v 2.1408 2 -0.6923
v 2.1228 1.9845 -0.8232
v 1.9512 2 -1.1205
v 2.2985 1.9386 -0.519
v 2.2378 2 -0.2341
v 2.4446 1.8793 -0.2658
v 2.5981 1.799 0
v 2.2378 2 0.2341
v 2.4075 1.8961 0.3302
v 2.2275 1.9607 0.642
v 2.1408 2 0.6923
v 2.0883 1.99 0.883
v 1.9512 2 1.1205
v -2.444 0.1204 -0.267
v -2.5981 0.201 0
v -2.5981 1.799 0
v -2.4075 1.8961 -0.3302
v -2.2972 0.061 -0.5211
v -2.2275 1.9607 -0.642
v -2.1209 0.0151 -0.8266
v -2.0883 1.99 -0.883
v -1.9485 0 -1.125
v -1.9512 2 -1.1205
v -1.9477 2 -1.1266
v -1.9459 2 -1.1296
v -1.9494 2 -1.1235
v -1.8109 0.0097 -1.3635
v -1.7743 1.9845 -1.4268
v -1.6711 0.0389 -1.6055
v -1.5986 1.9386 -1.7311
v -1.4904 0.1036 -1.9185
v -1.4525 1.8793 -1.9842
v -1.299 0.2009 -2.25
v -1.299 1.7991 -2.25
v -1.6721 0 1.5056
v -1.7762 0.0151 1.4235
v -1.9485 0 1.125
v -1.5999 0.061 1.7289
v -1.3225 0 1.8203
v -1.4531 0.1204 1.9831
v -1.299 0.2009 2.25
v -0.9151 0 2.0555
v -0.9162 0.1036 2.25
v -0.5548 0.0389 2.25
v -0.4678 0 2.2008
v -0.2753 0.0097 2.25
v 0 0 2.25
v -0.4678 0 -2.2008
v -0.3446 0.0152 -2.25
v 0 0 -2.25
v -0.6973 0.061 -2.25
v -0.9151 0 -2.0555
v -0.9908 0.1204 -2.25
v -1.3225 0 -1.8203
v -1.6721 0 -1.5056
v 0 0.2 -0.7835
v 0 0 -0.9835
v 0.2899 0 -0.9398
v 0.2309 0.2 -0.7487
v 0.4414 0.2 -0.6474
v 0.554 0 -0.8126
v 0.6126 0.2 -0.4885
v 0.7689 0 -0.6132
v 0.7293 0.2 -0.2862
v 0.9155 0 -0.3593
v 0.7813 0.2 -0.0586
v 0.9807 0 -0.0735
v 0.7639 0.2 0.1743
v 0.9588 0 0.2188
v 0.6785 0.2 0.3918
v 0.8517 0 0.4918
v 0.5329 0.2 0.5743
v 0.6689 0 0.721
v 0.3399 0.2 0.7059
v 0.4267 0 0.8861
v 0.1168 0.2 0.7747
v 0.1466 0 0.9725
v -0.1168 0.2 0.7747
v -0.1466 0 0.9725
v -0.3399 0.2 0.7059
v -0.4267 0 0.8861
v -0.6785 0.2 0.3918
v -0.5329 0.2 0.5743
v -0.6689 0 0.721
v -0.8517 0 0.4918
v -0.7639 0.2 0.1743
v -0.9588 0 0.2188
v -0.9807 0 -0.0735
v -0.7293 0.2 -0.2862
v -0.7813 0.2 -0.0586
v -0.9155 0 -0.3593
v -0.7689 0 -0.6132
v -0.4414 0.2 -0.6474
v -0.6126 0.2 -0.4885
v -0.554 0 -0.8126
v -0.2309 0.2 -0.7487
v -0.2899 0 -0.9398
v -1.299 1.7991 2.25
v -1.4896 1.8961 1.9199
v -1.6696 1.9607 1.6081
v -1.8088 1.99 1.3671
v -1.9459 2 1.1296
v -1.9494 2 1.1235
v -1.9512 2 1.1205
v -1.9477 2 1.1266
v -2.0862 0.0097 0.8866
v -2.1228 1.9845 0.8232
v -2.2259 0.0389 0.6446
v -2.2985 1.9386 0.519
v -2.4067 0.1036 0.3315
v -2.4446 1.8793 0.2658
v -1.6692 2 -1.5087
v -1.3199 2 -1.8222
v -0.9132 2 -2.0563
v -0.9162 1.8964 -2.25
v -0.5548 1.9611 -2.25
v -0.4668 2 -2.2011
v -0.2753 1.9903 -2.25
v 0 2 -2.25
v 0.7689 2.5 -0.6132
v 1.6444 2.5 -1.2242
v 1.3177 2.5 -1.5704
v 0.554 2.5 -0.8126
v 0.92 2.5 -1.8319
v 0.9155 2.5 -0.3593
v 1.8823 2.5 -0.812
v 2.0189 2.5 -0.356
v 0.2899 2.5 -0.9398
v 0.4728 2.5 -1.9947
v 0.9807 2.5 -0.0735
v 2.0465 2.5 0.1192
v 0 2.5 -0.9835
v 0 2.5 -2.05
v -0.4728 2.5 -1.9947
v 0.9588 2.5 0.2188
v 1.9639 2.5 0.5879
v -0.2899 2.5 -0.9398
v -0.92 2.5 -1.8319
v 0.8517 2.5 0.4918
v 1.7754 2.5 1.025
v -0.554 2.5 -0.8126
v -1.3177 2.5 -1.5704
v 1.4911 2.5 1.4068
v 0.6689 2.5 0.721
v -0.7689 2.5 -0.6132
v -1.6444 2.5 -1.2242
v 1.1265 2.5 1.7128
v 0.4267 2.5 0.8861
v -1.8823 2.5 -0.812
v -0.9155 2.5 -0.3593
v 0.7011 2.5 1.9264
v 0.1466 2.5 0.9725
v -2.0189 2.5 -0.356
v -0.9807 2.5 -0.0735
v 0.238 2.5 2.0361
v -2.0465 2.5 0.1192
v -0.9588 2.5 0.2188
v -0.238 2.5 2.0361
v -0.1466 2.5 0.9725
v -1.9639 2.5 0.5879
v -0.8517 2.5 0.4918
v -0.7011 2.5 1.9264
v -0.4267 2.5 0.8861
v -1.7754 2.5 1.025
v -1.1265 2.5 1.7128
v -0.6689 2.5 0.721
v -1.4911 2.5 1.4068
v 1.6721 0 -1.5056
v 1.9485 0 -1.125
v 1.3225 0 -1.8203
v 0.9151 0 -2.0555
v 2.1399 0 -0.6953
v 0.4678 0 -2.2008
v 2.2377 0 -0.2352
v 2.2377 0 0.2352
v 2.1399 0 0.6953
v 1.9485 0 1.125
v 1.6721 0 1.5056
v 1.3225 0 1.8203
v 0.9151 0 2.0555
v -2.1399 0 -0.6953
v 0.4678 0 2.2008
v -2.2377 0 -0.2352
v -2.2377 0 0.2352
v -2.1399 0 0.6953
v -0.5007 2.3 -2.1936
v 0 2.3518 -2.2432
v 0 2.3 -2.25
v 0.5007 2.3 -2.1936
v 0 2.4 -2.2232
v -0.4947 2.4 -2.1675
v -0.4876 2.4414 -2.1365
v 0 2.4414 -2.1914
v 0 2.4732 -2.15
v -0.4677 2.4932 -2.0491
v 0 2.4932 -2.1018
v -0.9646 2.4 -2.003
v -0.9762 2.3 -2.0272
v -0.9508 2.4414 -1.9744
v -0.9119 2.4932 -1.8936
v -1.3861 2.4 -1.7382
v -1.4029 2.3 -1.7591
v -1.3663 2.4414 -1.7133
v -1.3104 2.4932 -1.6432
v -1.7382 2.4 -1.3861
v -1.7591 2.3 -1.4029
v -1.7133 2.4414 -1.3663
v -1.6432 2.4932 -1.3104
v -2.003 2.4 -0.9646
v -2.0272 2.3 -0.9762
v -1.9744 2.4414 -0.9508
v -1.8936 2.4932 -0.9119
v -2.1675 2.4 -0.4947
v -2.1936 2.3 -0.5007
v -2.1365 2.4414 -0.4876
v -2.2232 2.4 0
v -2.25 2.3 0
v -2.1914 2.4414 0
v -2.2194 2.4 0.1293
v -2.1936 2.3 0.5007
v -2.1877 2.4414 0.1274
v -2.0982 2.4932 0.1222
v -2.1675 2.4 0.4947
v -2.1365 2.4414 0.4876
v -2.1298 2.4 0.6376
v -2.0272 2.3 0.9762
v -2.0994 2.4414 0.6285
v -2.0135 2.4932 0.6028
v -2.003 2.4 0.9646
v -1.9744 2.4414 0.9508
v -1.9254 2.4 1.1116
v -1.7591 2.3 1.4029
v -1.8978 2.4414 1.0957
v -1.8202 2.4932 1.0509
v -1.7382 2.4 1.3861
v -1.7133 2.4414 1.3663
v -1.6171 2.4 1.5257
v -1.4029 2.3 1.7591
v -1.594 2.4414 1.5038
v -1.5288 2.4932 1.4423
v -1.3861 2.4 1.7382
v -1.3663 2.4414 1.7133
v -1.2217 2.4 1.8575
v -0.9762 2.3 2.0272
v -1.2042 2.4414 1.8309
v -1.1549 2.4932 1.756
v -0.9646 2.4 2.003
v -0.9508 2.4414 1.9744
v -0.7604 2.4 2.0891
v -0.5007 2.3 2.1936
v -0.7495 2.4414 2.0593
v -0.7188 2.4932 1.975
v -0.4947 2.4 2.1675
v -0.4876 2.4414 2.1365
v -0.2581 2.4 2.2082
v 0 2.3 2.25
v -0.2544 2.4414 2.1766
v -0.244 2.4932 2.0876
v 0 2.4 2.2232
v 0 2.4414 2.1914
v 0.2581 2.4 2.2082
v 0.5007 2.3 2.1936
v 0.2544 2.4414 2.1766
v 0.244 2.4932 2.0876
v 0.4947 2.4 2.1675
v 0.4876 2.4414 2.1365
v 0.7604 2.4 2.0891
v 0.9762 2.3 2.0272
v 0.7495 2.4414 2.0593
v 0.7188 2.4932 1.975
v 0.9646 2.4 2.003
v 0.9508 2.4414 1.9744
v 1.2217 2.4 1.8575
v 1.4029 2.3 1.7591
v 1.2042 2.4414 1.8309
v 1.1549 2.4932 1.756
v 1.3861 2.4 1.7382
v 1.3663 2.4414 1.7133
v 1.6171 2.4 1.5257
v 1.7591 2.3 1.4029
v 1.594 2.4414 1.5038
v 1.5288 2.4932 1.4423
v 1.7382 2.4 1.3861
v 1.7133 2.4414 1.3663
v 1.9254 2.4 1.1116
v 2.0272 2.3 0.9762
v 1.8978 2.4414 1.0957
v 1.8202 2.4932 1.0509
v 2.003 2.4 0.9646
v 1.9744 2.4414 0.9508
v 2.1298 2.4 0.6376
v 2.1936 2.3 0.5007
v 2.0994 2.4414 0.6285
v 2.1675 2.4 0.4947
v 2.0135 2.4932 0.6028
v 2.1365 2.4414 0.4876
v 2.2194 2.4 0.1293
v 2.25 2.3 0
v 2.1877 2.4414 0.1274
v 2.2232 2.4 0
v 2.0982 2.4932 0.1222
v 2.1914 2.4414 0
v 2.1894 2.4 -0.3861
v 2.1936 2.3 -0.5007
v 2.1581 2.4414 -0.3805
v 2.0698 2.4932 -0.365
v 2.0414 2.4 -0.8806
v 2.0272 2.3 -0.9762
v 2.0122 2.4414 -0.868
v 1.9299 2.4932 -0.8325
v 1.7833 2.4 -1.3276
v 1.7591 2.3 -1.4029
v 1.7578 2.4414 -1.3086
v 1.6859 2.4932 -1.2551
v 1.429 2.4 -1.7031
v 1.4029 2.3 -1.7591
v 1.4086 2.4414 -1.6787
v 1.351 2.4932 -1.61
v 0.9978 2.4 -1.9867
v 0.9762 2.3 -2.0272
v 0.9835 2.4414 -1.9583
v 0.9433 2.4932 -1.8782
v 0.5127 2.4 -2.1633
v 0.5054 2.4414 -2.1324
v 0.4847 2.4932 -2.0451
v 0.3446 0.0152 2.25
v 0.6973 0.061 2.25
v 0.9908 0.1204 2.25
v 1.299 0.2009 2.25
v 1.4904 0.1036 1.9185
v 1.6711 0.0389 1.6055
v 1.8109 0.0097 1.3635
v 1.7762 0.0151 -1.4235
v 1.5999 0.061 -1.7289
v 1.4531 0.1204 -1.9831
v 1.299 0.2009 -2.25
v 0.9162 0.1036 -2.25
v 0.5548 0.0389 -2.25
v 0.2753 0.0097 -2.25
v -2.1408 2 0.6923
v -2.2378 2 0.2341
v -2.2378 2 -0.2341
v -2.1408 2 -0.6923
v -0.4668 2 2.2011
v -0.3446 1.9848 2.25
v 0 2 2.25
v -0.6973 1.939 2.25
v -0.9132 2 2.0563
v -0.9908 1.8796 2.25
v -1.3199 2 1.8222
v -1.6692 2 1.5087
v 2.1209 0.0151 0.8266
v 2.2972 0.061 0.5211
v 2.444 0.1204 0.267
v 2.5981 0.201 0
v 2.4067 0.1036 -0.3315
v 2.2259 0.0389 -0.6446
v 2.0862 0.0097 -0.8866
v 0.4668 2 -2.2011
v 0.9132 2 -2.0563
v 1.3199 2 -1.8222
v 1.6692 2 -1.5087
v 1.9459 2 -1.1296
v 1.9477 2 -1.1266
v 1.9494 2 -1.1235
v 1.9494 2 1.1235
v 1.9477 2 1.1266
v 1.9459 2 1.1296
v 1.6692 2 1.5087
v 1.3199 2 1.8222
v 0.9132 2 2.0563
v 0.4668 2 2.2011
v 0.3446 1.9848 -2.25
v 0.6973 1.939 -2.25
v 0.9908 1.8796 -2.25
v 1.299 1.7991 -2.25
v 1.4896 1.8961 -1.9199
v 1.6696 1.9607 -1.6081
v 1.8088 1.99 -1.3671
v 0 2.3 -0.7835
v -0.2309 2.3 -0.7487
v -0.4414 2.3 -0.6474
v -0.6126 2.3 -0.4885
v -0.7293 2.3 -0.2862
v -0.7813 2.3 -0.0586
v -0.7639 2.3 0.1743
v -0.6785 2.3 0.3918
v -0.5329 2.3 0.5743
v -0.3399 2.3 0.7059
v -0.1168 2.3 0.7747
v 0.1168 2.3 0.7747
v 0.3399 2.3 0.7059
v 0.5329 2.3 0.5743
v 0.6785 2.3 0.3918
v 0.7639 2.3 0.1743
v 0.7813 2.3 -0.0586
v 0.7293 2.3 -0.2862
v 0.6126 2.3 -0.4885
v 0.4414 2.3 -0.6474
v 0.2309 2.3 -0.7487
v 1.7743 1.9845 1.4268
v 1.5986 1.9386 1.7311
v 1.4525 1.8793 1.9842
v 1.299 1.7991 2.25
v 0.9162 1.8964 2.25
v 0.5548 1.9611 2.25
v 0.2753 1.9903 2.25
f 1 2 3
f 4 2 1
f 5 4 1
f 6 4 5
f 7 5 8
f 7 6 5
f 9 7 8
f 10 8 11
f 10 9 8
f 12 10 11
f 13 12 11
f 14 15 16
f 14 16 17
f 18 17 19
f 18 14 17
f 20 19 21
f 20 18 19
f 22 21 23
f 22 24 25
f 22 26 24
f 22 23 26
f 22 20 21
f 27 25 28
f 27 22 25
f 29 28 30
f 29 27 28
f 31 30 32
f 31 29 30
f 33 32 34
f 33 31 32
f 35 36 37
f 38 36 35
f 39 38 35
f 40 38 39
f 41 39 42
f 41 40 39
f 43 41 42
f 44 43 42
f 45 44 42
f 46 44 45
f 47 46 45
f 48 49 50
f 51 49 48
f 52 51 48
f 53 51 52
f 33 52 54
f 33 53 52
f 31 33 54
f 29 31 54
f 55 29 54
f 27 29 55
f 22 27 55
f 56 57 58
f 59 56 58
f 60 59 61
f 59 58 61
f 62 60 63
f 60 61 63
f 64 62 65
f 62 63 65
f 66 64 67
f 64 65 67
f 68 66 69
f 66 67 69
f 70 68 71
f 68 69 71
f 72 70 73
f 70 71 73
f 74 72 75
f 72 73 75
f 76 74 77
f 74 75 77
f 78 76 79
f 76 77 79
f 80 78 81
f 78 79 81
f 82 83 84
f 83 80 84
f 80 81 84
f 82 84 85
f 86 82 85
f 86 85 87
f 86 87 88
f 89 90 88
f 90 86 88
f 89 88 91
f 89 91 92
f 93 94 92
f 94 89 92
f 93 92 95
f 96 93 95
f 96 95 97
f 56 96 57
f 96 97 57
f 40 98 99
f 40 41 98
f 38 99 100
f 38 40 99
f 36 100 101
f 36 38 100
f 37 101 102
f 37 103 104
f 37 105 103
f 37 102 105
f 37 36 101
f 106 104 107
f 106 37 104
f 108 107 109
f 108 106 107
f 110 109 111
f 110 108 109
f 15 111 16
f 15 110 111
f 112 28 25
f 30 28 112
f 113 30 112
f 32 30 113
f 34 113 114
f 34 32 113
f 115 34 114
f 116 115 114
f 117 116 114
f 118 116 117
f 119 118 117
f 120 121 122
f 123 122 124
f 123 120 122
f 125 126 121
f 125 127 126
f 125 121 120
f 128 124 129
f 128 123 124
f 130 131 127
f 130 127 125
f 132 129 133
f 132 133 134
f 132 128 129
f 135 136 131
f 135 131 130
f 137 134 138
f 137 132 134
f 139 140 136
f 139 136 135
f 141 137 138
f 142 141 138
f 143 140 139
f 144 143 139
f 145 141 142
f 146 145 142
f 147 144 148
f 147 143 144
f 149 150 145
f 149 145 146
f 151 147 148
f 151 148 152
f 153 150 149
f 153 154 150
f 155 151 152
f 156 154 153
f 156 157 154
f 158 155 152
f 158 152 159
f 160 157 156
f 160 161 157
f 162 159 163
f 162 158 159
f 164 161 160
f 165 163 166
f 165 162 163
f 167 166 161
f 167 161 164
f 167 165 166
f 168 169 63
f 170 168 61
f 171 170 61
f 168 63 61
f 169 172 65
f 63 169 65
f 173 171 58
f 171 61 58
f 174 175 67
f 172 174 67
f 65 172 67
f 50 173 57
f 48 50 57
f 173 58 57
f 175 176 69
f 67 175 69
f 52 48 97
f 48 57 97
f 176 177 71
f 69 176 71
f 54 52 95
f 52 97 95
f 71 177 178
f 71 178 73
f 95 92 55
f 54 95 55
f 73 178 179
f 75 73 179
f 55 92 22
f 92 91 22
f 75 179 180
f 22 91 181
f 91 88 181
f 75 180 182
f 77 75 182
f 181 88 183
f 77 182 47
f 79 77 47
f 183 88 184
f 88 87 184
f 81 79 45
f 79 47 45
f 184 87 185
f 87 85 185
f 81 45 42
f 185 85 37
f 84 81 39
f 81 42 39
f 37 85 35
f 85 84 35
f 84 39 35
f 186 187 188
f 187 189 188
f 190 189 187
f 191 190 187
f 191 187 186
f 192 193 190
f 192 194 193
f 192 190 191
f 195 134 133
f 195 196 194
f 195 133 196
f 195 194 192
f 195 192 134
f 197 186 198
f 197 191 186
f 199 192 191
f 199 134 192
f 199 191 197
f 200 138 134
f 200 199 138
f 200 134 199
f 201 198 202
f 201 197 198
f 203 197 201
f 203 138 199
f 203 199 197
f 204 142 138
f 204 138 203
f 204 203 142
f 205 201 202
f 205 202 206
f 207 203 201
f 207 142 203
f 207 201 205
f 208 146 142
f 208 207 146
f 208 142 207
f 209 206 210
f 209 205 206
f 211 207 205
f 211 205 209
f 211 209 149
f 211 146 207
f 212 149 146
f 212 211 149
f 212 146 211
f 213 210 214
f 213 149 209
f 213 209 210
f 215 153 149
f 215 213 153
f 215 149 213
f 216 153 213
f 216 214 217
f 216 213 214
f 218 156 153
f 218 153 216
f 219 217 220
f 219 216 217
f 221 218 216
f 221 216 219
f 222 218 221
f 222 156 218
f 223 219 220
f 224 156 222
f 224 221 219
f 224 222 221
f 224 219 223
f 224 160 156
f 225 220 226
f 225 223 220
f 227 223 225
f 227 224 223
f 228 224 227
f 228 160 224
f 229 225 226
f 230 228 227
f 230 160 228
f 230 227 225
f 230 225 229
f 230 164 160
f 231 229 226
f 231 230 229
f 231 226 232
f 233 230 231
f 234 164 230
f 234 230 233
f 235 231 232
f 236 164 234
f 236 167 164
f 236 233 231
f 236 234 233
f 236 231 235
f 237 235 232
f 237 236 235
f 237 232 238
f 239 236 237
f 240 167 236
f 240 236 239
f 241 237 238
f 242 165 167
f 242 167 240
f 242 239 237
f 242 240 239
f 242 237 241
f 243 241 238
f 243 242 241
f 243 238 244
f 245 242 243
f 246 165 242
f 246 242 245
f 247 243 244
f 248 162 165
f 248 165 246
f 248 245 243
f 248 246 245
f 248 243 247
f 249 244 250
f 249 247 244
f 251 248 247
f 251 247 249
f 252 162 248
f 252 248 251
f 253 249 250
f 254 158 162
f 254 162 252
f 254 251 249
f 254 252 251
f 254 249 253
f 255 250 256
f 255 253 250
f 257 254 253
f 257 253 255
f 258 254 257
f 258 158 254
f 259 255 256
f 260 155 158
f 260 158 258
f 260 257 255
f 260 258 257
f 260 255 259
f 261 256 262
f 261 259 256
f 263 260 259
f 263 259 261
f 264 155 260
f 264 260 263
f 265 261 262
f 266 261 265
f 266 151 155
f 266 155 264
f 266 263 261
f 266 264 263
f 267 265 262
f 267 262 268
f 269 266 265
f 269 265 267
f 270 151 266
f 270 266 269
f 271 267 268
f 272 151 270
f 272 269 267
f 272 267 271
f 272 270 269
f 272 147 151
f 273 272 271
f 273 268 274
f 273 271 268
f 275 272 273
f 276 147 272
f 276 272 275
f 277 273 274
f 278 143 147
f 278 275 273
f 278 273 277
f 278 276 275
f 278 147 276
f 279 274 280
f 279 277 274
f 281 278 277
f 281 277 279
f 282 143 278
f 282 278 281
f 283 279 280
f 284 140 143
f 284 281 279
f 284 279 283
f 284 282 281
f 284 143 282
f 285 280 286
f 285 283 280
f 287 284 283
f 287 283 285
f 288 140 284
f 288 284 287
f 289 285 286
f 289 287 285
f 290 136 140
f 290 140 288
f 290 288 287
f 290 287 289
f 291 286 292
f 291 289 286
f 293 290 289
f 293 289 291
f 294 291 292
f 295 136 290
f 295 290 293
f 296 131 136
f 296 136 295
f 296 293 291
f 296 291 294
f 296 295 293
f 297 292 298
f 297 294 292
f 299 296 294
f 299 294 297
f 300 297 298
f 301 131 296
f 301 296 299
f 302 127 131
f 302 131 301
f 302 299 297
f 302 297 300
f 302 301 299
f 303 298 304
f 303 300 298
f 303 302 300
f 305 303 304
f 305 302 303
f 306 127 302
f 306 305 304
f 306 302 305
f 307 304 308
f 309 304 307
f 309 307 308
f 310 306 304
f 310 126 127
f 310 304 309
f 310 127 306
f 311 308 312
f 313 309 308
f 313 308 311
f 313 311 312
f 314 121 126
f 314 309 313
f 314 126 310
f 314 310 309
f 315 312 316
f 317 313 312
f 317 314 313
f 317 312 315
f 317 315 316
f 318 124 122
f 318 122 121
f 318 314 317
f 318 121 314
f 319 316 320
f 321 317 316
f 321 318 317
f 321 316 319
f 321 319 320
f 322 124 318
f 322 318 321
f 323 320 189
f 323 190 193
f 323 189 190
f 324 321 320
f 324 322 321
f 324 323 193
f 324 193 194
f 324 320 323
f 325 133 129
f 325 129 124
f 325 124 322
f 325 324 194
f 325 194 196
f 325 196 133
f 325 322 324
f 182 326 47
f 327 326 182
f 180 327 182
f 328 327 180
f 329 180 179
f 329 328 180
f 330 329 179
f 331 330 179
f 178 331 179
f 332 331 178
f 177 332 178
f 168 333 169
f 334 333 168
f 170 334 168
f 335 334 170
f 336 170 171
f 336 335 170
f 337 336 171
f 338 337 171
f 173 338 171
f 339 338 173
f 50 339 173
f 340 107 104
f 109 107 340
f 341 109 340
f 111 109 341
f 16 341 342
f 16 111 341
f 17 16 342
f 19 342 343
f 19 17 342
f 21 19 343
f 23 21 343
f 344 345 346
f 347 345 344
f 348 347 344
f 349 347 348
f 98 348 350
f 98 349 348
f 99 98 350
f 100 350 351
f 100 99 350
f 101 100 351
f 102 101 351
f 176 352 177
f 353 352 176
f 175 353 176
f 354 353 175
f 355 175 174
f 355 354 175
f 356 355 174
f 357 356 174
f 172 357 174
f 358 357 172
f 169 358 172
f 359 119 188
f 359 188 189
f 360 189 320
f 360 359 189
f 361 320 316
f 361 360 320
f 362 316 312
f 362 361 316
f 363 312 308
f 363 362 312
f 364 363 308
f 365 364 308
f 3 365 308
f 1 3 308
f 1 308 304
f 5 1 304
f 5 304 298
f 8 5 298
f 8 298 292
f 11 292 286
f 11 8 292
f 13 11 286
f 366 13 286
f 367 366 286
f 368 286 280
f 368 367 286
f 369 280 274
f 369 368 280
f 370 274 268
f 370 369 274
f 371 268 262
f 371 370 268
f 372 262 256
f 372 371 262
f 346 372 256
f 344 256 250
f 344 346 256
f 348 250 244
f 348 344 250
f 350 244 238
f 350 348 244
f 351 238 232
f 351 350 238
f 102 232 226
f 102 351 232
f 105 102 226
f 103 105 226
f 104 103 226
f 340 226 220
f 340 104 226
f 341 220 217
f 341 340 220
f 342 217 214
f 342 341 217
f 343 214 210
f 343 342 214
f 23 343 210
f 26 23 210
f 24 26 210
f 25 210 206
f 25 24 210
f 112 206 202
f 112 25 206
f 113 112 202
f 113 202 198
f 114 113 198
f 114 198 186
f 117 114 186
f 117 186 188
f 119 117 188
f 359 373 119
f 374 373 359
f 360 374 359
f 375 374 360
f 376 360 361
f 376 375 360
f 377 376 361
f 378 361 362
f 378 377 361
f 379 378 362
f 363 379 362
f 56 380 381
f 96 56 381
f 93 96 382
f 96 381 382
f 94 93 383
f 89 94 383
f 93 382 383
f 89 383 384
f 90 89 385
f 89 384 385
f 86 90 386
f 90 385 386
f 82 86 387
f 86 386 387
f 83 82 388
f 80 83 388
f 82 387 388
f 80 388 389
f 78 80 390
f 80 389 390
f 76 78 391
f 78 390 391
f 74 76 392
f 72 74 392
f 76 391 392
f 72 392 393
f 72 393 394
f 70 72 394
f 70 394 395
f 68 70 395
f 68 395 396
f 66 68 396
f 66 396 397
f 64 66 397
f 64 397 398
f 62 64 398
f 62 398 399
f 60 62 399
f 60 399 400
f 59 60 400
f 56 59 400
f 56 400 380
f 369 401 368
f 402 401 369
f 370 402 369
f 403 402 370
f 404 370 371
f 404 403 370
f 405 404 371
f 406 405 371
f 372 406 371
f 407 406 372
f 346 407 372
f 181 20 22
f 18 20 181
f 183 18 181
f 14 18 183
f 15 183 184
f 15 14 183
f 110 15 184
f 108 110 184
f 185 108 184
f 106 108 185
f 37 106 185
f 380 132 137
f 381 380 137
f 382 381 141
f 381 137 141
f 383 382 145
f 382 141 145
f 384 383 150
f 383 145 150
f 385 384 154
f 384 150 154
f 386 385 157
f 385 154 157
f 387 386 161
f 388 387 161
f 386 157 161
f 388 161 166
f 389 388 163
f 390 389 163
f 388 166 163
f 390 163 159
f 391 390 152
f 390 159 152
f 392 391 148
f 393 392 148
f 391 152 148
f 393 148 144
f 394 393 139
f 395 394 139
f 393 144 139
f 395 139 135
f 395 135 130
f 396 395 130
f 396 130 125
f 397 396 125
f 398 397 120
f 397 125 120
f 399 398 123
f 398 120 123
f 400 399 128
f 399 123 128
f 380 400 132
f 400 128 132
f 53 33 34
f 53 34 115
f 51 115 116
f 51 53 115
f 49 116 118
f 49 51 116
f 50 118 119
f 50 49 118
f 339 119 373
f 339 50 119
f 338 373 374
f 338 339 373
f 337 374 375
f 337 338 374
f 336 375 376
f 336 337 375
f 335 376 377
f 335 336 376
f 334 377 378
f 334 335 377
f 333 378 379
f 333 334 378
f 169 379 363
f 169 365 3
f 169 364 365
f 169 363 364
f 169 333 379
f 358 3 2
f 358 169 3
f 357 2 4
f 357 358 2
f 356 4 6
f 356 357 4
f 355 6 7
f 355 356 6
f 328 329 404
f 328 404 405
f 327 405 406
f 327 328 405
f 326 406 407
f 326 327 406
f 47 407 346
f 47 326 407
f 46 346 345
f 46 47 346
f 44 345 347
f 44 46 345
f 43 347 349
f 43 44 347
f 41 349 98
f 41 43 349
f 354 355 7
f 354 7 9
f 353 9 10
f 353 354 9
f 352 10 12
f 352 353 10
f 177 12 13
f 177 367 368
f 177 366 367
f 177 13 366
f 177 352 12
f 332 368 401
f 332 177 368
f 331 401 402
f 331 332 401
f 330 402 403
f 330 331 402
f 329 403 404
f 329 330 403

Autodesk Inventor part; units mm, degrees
ref_plane "YZ Plane" through (0, 0, 0) normal (1, 0, 0) x (0, 1, 0)
ref_plane "XZ Plane" through (0, 0, 0) normal (0, 1, 0) x (-1, 0, 0)
ref_plane "XY Plane" through (0, 0, 0) normal (0, 0, 1) x (1, 0, 0)
sketch "Sketch1" plane through (0, 0, 0) normal (0, 1, 0) x (-1, 0, 0)
  line L0 (-2.5981, 0) -> (-1.299, 2.25)
  line L1 (-1.299, 2.25) -> (1.299, 2.25)
  line L2 (1.299, 2.25) -> (2.5981, 0)
  line L3 (2.5981, 0) -> (1.299, -2.25)
  line L4 (1.299, -2.25) -> (-1.299, -2.25)
  line L5 (-1.299, -2.25) -> (-2.5981, 0)
  point P0 (0, 0)
  point P1 (0, 0)
  dimension "d0" = 4.5
extrude "Extrusion1" add sketch "Sketch1" along normal blind 2.5
sketch "Sketch2" plane through (0, 0, 0) normal (1, 0, 0) x (0, 1, 0)
  line L0 (0, -2.25) -> (0, 0) construction
  line L1 (2.5, -2.25) -> (2.5, 0) construction
  line L2 (0, -2.25) -> (0, -5.0728)
  line L3 (0, -5.0728) -> (1.6297, -5.0728)
  line L4 (1.6297, -5.0728) -> (0, -2.25)
  line L5 (2.5, -2.25) -> (2, -2.25)
  line L6 (2, -2.25) -> (1.5484, -3.0322)
  line L7 (1.5484, -3.0322) -> (2.5, -3.0322)
  line L8 (2.5, -3.0322) -> (2.5, -2.25)
  line L9 (0, -2.25) -> (2.5, -2.25) construction
  line L10 (0, 0) -> (3.5883, 0) construction
  dimension "d4" = 30
  dimension "d5" = 2
  dimension "d6" = 30
  dimension "d7" = 4.5
revolve "Revolution1" cut sketch "Sketch2" angle 360 about axis through (0, 0, 0) along (0, 1, 0)
fillet "Fillet1" radius 0.2 1 edges at (0, 2.5, 2.25)
sketch "Sketch4" plane through (0, 0, 0) normal (0, -1, 0) x (1, 0, 0)
  point P0 (0, 0)
  point P1 (0, 0)
hole "Hole1" at (0, 0, 0) direction (0, 1, 0) diameter 1.567 end through all thread size "M2x0.4" class "6H" standard "ANSI Metric M Profile"
chamfer "Chamfer1" distance 0.2 angle 45 2 edges at (0, 2.5, 0.7835) (0, 0, 0.7835)
properties part number "10_028_NYLON_NUT_M2_R1"
